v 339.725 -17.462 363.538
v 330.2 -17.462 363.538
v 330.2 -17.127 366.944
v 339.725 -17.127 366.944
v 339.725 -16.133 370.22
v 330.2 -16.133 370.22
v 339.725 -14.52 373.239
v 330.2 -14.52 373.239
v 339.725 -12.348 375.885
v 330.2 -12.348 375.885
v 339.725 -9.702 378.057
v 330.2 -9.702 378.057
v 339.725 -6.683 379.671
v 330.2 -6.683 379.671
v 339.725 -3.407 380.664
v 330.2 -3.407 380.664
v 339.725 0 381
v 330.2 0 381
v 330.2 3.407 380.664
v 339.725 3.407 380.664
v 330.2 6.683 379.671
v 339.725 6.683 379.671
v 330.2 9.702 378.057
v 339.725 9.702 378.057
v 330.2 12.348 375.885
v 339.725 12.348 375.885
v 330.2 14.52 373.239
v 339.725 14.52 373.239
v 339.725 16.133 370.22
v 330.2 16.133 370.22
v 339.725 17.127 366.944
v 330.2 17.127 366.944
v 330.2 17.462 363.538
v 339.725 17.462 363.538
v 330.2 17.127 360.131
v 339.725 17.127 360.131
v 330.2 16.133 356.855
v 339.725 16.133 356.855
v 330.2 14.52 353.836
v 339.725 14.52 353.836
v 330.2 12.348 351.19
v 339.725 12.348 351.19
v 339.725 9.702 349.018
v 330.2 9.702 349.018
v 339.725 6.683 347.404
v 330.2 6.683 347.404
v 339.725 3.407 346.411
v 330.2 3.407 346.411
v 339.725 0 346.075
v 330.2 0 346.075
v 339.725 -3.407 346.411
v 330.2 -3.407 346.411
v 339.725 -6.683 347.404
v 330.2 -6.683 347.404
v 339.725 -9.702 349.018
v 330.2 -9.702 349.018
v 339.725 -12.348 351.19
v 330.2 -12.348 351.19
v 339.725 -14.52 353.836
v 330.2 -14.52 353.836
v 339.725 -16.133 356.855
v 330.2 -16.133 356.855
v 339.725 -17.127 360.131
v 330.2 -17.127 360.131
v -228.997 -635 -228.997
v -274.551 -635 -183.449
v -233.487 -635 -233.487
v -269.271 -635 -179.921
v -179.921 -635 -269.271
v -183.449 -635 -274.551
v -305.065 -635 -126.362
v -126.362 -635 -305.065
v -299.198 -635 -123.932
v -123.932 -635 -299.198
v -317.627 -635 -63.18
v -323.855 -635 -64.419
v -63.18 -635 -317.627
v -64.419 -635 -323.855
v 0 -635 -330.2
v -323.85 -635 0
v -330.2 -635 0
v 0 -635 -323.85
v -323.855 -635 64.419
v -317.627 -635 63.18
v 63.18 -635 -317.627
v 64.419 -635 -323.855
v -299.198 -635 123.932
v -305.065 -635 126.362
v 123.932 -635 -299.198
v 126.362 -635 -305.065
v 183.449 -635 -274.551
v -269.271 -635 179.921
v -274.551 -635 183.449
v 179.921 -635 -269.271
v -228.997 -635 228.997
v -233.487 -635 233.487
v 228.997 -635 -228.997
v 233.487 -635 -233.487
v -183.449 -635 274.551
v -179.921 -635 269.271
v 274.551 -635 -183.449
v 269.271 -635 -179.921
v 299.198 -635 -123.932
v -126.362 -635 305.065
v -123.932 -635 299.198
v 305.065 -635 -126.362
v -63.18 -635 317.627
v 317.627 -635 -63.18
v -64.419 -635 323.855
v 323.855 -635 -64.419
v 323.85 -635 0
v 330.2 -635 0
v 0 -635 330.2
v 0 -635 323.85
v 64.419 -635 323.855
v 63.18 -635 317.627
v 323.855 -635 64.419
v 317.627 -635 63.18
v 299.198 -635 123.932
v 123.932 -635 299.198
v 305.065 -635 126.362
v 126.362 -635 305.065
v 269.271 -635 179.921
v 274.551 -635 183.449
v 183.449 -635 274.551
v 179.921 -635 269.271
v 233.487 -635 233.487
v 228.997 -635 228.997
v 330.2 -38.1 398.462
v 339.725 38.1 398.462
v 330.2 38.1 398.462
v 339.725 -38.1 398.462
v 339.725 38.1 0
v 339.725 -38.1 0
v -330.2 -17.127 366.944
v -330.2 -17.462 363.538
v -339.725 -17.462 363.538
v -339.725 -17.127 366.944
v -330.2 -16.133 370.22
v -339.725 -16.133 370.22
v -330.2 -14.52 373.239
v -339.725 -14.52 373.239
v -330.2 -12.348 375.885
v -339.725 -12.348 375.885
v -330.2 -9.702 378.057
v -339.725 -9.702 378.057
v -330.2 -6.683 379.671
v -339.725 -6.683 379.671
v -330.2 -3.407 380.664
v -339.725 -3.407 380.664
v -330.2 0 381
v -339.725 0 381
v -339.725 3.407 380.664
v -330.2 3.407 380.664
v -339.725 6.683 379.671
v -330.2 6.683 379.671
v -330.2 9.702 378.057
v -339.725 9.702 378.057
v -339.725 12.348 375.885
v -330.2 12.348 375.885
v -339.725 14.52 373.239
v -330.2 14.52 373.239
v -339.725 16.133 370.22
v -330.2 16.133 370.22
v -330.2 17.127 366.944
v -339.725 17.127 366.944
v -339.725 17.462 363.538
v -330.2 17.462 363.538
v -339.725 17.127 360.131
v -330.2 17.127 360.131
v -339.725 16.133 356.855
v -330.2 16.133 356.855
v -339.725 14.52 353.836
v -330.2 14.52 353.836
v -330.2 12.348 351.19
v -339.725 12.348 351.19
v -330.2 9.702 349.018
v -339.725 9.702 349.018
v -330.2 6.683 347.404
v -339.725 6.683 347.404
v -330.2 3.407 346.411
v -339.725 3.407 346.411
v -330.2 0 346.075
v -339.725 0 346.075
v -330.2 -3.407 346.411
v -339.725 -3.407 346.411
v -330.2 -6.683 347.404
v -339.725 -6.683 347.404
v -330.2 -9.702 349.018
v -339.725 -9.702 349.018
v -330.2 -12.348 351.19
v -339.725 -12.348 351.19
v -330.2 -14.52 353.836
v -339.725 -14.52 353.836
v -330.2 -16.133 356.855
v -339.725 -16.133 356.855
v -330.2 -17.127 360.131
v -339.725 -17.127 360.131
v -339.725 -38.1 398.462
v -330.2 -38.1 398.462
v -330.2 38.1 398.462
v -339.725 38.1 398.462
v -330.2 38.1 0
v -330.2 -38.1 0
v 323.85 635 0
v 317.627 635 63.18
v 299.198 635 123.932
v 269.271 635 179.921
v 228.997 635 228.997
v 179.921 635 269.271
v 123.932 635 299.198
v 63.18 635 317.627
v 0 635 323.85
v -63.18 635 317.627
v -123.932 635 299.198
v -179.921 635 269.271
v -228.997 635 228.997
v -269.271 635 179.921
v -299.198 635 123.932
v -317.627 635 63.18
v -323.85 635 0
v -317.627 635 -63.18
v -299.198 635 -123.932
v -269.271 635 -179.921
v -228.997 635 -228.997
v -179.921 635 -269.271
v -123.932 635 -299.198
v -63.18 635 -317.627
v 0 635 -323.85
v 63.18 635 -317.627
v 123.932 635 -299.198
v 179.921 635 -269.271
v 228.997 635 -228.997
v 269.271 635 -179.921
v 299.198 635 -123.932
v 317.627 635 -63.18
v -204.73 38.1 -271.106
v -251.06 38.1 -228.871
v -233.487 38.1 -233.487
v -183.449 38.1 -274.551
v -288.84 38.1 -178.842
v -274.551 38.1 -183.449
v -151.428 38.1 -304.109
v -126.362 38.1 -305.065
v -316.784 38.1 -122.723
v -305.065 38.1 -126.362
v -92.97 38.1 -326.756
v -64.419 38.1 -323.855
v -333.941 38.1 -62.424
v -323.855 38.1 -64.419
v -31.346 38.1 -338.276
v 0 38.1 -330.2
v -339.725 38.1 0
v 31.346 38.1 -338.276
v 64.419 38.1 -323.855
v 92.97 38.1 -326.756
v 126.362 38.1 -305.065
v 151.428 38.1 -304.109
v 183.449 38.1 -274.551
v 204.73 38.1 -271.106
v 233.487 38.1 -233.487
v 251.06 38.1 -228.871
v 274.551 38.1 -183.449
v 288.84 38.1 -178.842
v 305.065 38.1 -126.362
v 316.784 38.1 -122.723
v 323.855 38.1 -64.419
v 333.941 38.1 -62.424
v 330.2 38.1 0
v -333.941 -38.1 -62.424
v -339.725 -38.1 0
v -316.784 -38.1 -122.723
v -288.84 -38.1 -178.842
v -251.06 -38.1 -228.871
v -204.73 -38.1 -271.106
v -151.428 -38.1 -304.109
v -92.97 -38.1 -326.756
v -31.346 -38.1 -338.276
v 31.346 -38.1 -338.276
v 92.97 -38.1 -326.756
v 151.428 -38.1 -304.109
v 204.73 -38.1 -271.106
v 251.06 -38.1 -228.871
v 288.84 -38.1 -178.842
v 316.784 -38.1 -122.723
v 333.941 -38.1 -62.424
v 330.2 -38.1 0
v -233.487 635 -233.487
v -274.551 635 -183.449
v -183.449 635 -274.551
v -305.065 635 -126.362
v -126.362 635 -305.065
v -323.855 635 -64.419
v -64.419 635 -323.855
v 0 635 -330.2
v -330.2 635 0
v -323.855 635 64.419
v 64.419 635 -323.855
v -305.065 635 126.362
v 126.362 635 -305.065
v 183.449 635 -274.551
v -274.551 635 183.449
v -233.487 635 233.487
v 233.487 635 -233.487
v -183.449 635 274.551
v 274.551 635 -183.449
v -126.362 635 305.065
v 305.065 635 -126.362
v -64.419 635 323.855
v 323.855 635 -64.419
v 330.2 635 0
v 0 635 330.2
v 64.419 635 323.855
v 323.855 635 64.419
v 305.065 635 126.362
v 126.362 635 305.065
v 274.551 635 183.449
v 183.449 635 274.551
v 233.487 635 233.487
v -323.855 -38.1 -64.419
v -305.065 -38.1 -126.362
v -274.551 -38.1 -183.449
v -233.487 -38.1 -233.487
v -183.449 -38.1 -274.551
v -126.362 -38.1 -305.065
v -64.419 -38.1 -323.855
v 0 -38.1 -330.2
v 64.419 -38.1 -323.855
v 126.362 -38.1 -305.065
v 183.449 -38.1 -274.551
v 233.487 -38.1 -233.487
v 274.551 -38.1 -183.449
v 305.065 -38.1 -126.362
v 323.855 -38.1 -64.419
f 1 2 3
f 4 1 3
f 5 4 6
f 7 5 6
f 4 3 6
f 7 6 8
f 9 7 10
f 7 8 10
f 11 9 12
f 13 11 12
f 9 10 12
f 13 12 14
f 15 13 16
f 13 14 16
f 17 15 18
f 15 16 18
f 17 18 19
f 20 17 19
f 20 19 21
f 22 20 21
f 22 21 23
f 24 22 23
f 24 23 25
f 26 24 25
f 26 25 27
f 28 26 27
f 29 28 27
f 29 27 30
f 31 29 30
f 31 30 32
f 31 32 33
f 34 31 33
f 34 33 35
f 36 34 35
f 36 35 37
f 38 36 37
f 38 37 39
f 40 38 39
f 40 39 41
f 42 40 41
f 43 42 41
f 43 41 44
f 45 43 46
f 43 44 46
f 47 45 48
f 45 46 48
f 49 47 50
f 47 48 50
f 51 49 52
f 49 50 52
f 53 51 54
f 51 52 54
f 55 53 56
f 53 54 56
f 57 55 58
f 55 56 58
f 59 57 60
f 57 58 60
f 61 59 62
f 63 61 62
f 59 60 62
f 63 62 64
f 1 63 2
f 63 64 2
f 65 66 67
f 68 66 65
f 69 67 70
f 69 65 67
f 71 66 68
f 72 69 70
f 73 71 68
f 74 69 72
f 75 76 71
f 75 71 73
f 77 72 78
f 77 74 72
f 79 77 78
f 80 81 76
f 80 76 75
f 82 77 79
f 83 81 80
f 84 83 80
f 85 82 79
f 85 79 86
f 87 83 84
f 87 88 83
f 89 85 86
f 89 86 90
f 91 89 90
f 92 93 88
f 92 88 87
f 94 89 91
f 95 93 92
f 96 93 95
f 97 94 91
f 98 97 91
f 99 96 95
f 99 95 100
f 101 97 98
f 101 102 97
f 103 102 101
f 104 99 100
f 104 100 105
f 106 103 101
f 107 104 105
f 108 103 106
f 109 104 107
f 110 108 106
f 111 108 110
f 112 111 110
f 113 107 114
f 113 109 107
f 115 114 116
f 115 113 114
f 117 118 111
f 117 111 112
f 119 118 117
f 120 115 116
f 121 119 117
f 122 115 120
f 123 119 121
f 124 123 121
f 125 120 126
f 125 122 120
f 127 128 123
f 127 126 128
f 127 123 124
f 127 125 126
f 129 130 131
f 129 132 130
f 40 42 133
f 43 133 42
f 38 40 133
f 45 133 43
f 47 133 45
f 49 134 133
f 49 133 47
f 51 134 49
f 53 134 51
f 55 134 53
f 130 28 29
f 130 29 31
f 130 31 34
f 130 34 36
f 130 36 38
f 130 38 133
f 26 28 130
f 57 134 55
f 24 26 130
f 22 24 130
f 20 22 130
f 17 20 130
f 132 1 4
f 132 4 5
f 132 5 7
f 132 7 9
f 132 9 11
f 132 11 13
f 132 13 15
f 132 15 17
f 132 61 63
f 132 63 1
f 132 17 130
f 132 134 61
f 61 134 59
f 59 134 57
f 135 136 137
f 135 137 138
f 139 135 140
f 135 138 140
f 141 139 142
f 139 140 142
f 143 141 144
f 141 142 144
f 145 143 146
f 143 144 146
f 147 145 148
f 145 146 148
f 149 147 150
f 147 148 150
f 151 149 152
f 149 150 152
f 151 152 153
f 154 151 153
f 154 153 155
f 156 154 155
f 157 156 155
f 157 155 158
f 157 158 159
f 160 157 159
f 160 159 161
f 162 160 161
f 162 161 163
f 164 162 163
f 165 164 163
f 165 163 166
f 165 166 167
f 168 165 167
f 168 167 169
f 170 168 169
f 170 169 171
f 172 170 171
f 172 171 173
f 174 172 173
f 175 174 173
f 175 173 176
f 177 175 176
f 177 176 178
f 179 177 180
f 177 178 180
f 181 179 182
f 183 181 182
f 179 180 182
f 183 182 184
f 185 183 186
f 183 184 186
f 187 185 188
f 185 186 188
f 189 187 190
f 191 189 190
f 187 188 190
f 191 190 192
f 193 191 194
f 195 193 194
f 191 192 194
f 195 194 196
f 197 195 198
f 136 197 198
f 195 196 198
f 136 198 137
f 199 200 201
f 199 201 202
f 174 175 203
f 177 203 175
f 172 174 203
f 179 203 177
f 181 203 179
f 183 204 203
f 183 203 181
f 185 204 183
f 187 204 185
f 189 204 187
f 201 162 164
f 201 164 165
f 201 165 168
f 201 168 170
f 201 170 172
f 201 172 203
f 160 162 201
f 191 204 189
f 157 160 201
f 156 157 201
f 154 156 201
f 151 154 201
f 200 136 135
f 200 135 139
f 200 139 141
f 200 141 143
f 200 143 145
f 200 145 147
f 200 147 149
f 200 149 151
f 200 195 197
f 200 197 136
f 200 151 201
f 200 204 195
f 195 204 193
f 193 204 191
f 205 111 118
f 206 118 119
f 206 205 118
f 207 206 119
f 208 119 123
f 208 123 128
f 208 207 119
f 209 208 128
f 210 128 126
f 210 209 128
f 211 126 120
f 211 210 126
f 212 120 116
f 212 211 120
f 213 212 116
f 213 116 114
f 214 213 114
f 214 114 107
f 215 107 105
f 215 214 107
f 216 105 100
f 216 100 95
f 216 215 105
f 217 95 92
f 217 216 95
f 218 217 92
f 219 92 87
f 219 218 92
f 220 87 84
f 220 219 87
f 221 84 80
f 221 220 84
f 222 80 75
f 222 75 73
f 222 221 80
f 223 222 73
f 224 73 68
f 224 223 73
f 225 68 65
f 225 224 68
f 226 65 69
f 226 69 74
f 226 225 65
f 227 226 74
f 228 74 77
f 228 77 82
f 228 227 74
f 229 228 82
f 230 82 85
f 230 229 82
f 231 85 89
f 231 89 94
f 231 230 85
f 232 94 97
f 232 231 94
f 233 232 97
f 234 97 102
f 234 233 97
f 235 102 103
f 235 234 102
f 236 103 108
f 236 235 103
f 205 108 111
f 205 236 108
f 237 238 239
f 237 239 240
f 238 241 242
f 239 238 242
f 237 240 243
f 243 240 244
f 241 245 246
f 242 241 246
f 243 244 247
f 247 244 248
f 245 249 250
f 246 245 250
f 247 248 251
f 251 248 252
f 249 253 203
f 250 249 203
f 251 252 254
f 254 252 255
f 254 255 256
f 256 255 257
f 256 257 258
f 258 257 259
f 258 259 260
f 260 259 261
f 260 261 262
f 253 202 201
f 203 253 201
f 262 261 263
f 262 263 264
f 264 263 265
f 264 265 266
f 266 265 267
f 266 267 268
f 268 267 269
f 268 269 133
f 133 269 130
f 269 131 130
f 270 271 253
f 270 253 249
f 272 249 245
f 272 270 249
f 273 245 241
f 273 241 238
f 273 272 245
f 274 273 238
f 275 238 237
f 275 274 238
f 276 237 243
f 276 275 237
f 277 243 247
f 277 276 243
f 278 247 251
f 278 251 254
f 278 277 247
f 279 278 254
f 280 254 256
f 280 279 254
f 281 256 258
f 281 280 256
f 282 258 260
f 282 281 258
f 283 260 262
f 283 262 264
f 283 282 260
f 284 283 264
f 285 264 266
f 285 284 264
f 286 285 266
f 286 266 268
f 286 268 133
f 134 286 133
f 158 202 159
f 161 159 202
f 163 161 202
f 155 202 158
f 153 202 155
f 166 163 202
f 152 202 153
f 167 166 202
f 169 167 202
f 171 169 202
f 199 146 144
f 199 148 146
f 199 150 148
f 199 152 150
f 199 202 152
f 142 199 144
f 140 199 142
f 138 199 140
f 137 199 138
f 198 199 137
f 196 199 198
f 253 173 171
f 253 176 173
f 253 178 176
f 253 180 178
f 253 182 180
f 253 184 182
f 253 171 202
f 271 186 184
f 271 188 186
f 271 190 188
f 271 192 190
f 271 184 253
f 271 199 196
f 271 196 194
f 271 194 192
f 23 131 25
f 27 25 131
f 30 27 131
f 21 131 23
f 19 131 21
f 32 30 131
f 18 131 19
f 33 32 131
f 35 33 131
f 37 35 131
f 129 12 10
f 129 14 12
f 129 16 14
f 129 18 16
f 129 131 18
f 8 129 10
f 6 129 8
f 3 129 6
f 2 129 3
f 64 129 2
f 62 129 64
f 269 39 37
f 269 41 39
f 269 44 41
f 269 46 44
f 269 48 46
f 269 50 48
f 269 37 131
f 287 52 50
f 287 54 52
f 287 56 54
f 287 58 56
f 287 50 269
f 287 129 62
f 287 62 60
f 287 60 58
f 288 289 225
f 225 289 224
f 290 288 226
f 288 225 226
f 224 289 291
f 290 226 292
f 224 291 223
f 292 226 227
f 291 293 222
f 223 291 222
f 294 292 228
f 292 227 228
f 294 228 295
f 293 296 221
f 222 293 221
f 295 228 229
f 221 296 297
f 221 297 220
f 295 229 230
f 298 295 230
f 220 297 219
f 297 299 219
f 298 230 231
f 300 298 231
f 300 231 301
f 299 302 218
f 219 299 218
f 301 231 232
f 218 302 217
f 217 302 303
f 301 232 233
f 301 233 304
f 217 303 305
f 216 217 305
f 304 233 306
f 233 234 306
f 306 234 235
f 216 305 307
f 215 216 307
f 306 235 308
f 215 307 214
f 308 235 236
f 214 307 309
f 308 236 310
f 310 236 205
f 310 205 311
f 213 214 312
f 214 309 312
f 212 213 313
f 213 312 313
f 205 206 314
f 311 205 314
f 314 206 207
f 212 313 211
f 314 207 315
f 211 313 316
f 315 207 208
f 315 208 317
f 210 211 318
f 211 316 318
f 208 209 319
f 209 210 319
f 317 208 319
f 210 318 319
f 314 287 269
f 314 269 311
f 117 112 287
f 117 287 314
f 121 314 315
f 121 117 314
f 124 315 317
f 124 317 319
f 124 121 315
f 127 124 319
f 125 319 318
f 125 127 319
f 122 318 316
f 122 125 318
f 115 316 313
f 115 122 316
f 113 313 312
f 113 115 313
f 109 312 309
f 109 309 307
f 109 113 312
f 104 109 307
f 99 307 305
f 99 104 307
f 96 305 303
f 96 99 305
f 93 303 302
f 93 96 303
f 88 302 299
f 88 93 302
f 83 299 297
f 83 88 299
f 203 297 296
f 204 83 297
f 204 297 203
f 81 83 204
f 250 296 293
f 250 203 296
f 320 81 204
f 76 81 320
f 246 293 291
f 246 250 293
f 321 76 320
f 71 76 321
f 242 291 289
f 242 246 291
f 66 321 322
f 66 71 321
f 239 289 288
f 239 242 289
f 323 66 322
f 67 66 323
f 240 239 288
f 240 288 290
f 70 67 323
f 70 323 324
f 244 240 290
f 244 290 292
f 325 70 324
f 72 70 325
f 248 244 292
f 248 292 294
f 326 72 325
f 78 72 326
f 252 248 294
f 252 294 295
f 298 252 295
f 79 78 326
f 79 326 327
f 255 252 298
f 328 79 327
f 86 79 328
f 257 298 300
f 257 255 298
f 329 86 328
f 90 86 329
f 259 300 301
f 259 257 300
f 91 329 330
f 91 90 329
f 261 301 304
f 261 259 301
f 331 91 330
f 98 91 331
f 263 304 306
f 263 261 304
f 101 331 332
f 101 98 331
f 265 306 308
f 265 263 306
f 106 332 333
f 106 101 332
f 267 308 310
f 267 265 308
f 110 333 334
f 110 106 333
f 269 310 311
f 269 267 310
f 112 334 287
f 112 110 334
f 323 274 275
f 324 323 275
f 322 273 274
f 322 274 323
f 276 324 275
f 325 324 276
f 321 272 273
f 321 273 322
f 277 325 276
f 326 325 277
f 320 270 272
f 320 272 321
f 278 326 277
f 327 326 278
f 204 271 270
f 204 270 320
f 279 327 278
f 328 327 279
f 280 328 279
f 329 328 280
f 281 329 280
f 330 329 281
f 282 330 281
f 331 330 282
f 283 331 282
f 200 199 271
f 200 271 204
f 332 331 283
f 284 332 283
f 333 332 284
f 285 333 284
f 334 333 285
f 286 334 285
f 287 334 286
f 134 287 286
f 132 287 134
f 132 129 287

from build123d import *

# Parameters (mm, degrees)
F1_DEPTH = 38.1
F2_R     = 17.4625
F3_DEPTH = 679.451
F4_R     = 330.2
F4_R_2   = 323.85
F5_DEPTH = 635


with BuildPart() as f1:
    # F0 (on Front) → F1 (new body, symmetric)
    with BuildSketch(Plane.XZ):
        with BuildLine():
            ThreePointArc((330.2, 0), (0, -330.2), (-330.2, 0))
            Line((-330.2, 0), (-330.2, 398.4625))
            Line((-330.2, 398.4625), (-339.725, 398.4625))
            Line((-339.725, 398.4625), (-339.725, 0))
            ThreePointArc((-339.725, 0), (0, -339.725), (339.725, 0))
            Line((339.725, 0), (339.725, 398.4625))
            Line((339.725, 398.4625), (330.2, 398.4625))
            Line((330.2, 398.4625), (330.2, 0))
        make_face()
    extrude(amount=F1_DEPTH, both=True)

    # F2 (on face) → F3 (cut, through all)
    with BuildSketch(Plane(origin=(-339.725, 0, 0), x_dir=(0, -1, 0), z_dir=(-1, 0, 0))):
        with Locations((0, 363.5375)):
            Circle(F2_R)
    extrude(amount=-F3_DEPTH, mode=Mode.SUBTRACT)

    # F4 (on Front) → F5 (join, symmetric)
    with BuildSketch(Plane.XZ):
        Circle(F4_R)
        Circle(F4_R_2, mode=Mode.SUBTRACT)
    extrude(amount=F5_DEPTH, both=True)


solid = f1.part
